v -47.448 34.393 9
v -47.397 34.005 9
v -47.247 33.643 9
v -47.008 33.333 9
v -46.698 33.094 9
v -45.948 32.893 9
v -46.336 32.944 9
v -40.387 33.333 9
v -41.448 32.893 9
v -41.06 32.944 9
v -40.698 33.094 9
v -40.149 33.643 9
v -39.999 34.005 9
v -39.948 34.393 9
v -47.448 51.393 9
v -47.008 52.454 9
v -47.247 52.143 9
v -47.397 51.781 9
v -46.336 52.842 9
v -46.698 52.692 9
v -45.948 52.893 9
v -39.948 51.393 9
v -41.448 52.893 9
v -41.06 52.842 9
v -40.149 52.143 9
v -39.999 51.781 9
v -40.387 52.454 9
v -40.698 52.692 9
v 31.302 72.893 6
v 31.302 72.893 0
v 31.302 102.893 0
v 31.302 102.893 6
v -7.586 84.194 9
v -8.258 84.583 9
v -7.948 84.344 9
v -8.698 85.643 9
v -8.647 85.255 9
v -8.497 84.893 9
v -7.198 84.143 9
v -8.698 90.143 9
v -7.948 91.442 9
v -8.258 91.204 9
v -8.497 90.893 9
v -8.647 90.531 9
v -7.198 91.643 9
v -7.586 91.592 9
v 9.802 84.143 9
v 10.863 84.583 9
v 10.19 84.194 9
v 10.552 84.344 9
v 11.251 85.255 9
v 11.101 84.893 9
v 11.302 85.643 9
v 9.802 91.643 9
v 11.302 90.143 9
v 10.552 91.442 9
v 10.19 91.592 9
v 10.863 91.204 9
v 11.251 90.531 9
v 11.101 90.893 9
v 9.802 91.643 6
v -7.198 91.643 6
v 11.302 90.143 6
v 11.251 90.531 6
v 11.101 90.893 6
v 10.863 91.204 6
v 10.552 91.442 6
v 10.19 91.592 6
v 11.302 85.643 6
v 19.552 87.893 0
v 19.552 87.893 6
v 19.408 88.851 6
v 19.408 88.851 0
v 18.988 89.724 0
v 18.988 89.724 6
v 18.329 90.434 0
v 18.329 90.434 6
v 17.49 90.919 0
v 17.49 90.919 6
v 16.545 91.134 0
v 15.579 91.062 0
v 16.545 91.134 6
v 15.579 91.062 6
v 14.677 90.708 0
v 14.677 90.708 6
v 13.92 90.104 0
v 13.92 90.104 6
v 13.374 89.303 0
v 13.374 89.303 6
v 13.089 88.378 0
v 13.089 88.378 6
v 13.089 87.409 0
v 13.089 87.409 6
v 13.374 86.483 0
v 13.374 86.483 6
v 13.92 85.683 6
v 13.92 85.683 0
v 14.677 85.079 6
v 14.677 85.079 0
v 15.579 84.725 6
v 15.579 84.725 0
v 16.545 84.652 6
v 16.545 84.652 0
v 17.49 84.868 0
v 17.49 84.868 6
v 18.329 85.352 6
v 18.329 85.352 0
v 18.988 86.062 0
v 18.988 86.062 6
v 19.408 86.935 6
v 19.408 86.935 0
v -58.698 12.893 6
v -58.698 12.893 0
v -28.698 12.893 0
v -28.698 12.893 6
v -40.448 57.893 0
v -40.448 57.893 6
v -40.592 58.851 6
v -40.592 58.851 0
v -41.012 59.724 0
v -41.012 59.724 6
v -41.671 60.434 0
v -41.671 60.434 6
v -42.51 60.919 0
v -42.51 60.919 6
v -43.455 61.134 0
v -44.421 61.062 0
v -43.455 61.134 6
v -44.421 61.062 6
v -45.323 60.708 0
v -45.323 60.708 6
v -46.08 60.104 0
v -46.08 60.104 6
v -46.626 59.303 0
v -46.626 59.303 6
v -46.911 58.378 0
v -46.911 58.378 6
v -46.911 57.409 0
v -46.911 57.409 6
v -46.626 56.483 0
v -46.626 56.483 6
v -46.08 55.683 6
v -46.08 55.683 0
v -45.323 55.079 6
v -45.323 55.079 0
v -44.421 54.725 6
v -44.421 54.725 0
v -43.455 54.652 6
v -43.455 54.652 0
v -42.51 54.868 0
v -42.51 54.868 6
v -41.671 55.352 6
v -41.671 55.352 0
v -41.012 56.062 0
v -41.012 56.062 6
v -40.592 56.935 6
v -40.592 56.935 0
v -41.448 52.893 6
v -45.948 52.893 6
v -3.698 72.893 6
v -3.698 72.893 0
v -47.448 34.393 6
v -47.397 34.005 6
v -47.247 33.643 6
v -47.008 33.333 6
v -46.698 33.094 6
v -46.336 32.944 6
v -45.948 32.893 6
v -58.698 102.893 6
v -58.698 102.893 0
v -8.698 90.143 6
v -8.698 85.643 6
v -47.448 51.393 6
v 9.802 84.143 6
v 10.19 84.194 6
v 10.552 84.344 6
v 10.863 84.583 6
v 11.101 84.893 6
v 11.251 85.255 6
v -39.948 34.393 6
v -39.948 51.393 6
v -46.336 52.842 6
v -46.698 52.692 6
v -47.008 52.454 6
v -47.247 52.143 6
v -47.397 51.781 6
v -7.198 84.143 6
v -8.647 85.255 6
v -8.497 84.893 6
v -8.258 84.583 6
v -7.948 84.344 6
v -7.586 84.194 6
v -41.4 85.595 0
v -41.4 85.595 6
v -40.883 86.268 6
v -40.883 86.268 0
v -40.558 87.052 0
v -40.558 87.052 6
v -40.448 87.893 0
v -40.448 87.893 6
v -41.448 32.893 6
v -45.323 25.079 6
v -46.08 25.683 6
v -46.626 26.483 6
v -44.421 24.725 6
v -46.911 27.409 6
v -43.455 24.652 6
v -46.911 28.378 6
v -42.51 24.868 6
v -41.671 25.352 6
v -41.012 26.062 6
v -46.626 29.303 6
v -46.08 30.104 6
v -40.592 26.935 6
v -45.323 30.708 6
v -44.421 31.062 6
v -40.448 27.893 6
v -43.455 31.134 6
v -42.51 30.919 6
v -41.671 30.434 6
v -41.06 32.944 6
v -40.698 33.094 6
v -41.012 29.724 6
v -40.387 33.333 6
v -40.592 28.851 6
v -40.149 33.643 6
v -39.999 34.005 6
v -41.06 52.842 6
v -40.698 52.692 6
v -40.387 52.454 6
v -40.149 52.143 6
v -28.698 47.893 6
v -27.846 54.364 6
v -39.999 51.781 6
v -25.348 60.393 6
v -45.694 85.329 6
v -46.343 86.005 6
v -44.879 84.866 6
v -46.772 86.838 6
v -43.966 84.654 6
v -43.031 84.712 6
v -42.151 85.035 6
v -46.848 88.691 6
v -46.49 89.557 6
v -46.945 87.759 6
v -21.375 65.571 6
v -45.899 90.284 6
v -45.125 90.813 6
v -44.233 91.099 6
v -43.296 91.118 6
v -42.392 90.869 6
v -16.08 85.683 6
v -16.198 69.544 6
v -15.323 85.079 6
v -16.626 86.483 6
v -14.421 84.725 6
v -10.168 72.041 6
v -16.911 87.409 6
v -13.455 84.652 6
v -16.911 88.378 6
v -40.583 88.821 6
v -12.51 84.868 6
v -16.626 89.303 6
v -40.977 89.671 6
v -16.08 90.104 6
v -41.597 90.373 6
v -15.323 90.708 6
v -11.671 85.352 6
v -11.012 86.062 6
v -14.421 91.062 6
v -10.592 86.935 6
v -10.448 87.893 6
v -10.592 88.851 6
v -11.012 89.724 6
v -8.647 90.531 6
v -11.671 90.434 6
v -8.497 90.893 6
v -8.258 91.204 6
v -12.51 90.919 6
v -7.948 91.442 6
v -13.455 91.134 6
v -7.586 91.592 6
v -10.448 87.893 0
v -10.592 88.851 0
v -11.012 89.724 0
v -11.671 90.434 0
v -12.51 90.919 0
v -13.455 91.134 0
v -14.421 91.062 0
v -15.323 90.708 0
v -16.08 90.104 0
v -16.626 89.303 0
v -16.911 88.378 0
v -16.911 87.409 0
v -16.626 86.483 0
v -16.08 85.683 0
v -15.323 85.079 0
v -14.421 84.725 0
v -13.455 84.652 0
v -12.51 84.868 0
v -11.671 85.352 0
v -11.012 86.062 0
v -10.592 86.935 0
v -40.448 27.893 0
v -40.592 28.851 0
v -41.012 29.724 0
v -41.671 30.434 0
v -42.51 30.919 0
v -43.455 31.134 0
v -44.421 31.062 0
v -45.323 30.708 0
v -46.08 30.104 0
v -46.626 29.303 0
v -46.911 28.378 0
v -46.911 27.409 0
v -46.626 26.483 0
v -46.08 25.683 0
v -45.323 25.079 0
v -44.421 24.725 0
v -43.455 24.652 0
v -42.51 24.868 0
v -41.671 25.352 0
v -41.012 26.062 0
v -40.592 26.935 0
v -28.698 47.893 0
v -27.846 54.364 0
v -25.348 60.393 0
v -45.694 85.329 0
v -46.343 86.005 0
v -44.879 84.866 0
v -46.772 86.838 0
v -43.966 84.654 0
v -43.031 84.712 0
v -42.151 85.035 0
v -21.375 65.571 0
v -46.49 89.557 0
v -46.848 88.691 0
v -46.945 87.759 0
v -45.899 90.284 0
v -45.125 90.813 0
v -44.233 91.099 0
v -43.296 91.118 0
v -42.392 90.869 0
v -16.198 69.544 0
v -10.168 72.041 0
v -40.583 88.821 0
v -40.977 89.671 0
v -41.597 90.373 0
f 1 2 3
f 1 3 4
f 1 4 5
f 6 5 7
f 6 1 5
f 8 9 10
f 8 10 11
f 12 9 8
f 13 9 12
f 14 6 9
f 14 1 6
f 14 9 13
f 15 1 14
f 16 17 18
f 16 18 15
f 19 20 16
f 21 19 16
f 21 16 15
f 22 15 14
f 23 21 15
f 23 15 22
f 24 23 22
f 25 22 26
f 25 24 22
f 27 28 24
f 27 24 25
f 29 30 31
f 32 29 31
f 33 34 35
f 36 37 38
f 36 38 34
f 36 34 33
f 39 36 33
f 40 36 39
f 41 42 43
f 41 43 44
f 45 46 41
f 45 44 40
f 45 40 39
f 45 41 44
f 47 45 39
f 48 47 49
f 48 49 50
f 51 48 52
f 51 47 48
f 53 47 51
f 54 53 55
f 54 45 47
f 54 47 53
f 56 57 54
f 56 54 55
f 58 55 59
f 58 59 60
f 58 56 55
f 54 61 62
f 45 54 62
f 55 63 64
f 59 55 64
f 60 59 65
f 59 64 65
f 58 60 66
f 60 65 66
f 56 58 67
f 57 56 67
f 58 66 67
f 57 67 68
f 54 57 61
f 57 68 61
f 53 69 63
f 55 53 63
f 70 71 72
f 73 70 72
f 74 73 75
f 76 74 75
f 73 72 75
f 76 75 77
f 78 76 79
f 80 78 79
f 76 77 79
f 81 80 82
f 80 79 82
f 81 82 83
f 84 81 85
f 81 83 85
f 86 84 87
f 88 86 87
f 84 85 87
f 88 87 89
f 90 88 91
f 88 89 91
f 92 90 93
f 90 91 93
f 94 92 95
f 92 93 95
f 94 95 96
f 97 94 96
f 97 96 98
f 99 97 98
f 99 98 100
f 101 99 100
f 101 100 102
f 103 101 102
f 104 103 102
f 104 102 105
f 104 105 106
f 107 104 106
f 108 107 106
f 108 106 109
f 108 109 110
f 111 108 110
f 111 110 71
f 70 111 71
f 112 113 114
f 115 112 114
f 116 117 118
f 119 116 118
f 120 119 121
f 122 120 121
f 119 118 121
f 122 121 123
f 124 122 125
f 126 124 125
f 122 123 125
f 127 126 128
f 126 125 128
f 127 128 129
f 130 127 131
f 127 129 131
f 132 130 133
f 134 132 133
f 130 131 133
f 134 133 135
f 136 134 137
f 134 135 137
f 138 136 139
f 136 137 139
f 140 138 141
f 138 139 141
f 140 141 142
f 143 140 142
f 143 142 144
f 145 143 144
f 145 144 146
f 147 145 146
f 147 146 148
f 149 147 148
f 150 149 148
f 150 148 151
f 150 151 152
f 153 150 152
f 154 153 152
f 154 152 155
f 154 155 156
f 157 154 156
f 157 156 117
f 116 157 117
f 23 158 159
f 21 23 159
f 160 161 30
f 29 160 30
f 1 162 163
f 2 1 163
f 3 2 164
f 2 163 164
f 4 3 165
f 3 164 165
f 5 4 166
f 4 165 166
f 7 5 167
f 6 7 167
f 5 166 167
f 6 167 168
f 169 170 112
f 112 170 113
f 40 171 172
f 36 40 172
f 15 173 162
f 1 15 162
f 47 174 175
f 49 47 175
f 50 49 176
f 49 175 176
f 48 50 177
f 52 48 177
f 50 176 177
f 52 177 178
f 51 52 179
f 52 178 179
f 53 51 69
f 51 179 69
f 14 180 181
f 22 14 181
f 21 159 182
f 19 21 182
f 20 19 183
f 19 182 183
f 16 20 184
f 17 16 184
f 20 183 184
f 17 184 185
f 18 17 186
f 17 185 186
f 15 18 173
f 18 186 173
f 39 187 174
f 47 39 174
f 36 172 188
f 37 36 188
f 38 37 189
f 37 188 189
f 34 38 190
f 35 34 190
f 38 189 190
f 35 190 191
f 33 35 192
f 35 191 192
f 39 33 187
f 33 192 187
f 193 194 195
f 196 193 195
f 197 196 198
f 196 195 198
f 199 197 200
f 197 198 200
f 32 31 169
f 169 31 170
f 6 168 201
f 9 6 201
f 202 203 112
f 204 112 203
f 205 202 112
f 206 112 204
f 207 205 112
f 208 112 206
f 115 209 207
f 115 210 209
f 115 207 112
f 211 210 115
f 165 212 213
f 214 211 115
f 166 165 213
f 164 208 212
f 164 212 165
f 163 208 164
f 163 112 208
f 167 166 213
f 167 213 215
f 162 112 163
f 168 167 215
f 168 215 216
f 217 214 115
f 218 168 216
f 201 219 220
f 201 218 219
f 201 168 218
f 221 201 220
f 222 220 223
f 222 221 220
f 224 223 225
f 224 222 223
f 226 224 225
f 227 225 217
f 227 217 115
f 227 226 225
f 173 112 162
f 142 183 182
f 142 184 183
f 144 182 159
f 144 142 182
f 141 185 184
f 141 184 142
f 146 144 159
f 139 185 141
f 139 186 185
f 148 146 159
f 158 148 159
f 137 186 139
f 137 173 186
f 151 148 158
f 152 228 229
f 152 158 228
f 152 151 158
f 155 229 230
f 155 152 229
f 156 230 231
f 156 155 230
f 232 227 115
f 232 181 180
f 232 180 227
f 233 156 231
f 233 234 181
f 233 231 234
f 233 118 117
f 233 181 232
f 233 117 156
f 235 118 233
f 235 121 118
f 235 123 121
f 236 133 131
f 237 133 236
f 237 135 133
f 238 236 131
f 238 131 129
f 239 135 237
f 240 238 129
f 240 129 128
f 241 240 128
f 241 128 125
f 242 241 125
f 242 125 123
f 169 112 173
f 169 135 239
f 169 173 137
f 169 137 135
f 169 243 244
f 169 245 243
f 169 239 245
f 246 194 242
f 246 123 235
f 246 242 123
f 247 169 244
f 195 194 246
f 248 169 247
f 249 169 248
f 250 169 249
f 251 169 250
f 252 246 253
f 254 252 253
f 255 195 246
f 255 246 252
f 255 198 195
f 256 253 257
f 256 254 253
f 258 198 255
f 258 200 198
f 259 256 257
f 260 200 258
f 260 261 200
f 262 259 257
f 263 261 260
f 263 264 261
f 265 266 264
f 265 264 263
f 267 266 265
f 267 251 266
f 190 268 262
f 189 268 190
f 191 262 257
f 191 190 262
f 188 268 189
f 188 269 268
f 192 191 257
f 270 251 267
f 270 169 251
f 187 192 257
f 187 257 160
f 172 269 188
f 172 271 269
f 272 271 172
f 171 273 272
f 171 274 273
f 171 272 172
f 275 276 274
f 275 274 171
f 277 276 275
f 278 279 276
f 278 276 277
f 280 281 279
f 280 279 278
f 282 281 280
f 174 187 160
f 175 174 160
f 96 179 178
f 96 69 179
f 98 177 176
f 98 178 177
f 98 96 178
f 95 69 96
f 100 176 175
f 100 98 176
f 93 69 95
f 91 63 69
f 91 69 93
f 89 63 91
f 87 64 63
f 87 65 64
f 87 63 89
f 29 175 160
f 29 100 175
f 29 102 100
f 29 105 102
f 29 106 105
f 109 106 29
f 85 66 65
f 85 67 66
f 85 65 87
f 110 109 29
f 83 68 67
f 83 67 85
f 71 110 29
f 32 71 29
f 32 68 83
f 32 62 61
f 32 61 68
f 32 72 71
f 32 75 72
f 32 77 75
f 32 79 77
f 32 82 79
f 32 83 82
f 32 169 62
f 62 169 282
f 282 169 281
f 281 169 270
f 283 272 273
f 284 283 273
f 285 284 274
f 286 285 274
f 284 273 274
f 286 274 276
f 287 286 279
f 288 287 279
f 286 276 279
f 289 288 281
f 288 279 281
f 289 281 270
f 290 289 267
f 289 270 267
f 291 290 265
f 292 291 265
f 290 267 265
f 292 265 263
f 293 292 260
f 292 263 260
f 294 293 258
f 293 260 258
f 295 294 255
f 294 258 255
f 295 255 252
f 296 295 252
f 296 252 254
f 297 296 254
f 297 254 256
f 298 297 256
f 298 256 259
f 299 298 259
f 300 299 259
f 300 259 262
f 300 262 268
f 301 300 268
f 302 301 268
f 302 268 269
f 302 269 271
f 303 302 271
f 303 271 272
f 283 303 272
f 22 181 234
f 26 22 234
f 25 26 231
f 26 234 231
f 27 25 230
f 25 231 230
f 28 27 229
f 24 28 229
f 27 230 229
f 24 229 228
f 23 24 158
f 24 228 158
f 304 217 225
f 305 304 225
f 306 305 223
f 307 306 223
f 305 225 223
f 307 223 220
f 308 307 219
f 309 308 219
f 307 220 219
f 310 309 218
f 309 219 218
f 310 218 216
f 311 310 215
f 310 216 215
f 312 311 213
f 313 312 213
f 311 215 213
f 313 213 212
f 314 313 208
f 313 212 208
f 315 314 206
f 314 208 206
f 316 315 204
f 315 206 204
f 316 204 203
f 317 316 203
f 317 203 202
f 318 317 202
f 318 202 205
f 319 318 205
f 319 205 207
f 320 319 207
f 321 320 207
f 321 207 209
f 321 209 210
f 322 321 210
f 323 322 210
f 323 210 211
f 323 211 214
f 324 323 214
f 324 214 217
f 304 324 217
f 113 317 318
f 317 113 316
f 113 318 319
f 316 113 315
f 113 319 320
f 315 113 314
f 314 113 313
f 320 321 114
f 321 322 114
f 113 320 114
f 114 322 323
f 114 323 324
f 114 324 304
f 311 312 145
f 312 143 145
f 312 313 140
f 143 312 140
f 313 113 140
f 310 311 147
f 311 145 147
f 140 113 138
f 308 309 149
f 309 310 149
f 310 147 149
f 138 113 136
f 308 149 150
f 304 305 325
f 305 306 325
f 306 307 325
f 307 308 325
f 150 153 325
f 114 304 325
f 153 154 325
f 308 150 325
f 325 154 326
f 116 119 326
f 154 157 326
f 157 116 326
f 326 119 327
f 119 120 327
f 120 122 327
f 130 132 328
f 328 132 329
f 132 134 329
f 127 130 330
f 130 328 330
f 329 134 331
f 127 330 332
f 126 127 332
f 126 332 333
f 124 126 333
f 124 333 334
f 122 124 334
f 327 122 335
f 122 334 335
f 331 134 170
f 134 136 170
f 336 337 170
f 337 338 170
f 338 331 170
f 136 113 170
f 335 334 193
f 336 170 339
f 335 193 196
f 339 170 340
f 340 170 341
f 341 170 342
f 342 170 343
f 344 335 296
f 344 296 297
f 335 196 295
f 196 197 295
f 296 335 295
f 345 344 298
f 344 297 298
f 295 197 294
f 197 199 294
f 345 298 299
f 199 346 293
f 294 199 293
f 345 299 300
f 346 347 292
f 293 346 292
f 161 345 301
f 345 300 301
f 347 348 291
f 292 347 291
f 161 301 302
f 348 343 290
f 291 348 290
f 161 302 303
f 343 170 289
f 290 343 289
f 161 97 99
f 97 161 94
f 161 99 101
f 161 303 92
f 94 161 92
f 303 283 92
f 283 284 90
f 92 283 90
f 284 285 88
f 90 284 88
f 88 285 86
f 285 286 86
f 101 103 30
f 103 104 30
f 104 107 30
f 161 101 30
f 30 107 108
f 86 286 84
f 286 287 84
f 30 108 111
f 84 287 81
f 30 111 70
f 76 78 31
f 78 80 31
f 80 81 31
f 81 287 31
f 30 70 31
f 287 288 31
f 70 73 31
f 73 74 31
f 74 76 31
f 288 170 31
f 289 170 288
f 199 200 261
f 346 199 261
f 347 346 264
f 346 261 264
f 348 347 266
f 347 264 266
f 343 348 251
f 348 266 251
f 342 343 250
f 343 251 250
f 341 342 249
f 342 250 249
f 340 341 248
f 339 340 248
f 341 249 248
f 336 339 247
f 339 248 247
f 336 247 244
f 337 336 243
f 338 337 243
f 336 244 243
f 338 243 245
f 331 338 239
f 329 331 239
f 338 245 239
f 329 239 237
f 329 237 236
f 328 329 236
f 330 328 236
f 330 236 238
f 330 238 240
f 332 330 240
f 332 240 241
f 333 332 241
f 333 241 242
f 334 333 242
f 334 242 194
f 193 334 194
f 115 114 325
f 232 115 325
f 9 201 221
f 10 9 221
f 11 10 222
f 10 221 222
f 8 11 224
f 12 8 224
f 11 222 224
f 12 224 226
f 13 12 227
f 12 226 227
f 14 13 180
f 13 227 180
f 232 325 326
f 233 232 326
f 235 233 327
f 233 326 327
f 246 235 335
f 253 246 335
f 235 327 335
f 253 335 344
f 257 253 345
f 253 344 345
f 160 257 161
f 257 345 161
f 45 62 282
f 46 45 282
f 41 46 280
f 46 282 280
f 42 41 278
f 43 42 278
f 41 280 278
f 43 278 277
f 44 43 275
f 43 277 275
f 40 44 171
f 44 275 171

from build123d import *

# Parameters (mm, degrees)
F1_DEPTH = 6
F2_R     = 3.25
F3_DEPTH = 8
F5_DEPTH = 3


with BuildPart() as f1:
    # F0 (on Top) → F1 (new body)
    with BuildSketch(Plane.XY):
        with BuildLine():
            Line((-28.6977304518, 102.8932180628), (-58.6977304518, 102.8932180628))
            Line((-58.6977304518, 102.8932180628), (-58.6977304518, 72.8932180628))
            Line((-58.6977304518, 72.8932180628), (-58.6977304518, 12.8932180628))
            Line((-58.6977304518, 12.8932180628), (-28.6977304518, 12.8932180628))
            Line((-28.6977304518, 12.8932180628), (-28.6977304518, 47.8932180628))
            ThreePointArc((-28.6977304518, 47.8932180628), (-21.3753999815, 65.5708875925), (-3.6977304518, 72.8932180628))
            Line((-3.6977304518, 72.8932180628), (31.3022695482, 72.8932180628))
            Line((31.3022695482, 72.8932180628), (31.3022695482, 102.8932180628))
            Line((31.3022695482, 102.8932180628), (-28.6977304518, 102.8932180628))
        make_face()
    extrude(amount=F1_DEPTH)

    # F2 (on face) → F3 (cut)
    with BuildSketch(Plane.XY.offset(6)):
        with Locations((-13.6977304518, 87.8932180628)):
            Circle(F2_R)
        with Locations((16.3022695482, 87.8932180628)):
            Circle(F2_R)
        with Locations((-43.6977304518, 57.8932180628)):
            Circle(F2_R)
        with Locations((-43.6977304518, 27.8932180628)):
            Circle(F2_R)
        with BuildLine():
            Line((-45.9958274907, 90.1913151017), (-41.399633413, 85.595121024))
            ThreePointArc((-41.399633413, 85.595121024), (-40.6951219712, 86.6494969076), (-40.4477304518, 87.8932180628))
            ThreePointArc((-40.4477304518, 87.8932180628), (-42.4540092966, 90.8958265435), (-45.9958274907, 90.1913151017))
        make_face()
        with BuildLine():
            ThreePointArc((-45.9958274907, 90.1913151017), (-45.9958274907, 85.595121024), (-41.399633413, 85.595121024))
            Line((-41.399633413, 85.595121024), (-45.9958274907, 90.1913151017))
        make_face()
    extrude(amount=-F3_DEPTH, mode=Mode.SUBTRACT)

    # F4 (on face) → F5 (join)
    with BuildSketch(Plane.XY.offset(6)):
        with BuildLine():
            Line((9.8022695482, 91.6432180628), (-7.1977304518, 91.6432180628))
            ThreePointArc((-7.1977304518, 91.6432180628), (-8.2583906236, 91.2038782346), (-8.6977304518, 90.1432180628))
            Line((-8.6977304518, 90.1432180628), (-8.6977304518, 85.6432180628))
            ThreePointArc((-8.6977304518, 85.6432180628), (-8.2583906236, 84.582557891), (-7.1977304518, 84.1432180628))
            Line((-7.1977304518, 84.1432180628), (9.8022695482, 84.1432180628))
            ThreePointArc((9.8022695482, 84.1432180628), (10.86292972, 84.582557891), (11.3022695482, 85.6432180628))
            Line((11.3022695482, 85.6432180628), (11.3022695482, 90.1432180628))
            ThreePointArc((11.3022695482, 90.1432180628), (10.86292972, 91.2038782346), (9.8022695482, 91.6432180628))
        make_face()
        with BuildLine():
            Line((-41.4477304518, 52.8932180628), (-45.9477304518, 52.8932180628))
            ThreePointArc((-45.9477304518, 52.8932180628), (-47.0083906236, 52.4538782346), (-47.4477304518, 51.3932180628))
            Line((-47.4477304518, 51.3932180628), (-47.4477304518, 34.3932180628))
            ThreePointArc((-47.4477304518, 34.3932180628), (-47.0083906236, 33.332557891), (-45.9477304518, 32.8932180628))
            Line((-45.9477304518, 32.8932180628), (-41.4477304518, 32.8932180628))
            ThreePointArc((-41.4477304518, 32.8932180628), (-40.38707028, 33.332557891), (-39.9477304518, 34.3932180628))
            Line((-39.9477304518, 34.3932180628), (-39.9477304518, 51.3932180628))
            ThreePointArc((-39.9477304518, 51.3932180628), (-40.38707028, 52.4538782346), (-41.4477304518, 52.8932180628))
        make_face()
    extrude(amount=F5_DEPTH)


solid = f1.part
